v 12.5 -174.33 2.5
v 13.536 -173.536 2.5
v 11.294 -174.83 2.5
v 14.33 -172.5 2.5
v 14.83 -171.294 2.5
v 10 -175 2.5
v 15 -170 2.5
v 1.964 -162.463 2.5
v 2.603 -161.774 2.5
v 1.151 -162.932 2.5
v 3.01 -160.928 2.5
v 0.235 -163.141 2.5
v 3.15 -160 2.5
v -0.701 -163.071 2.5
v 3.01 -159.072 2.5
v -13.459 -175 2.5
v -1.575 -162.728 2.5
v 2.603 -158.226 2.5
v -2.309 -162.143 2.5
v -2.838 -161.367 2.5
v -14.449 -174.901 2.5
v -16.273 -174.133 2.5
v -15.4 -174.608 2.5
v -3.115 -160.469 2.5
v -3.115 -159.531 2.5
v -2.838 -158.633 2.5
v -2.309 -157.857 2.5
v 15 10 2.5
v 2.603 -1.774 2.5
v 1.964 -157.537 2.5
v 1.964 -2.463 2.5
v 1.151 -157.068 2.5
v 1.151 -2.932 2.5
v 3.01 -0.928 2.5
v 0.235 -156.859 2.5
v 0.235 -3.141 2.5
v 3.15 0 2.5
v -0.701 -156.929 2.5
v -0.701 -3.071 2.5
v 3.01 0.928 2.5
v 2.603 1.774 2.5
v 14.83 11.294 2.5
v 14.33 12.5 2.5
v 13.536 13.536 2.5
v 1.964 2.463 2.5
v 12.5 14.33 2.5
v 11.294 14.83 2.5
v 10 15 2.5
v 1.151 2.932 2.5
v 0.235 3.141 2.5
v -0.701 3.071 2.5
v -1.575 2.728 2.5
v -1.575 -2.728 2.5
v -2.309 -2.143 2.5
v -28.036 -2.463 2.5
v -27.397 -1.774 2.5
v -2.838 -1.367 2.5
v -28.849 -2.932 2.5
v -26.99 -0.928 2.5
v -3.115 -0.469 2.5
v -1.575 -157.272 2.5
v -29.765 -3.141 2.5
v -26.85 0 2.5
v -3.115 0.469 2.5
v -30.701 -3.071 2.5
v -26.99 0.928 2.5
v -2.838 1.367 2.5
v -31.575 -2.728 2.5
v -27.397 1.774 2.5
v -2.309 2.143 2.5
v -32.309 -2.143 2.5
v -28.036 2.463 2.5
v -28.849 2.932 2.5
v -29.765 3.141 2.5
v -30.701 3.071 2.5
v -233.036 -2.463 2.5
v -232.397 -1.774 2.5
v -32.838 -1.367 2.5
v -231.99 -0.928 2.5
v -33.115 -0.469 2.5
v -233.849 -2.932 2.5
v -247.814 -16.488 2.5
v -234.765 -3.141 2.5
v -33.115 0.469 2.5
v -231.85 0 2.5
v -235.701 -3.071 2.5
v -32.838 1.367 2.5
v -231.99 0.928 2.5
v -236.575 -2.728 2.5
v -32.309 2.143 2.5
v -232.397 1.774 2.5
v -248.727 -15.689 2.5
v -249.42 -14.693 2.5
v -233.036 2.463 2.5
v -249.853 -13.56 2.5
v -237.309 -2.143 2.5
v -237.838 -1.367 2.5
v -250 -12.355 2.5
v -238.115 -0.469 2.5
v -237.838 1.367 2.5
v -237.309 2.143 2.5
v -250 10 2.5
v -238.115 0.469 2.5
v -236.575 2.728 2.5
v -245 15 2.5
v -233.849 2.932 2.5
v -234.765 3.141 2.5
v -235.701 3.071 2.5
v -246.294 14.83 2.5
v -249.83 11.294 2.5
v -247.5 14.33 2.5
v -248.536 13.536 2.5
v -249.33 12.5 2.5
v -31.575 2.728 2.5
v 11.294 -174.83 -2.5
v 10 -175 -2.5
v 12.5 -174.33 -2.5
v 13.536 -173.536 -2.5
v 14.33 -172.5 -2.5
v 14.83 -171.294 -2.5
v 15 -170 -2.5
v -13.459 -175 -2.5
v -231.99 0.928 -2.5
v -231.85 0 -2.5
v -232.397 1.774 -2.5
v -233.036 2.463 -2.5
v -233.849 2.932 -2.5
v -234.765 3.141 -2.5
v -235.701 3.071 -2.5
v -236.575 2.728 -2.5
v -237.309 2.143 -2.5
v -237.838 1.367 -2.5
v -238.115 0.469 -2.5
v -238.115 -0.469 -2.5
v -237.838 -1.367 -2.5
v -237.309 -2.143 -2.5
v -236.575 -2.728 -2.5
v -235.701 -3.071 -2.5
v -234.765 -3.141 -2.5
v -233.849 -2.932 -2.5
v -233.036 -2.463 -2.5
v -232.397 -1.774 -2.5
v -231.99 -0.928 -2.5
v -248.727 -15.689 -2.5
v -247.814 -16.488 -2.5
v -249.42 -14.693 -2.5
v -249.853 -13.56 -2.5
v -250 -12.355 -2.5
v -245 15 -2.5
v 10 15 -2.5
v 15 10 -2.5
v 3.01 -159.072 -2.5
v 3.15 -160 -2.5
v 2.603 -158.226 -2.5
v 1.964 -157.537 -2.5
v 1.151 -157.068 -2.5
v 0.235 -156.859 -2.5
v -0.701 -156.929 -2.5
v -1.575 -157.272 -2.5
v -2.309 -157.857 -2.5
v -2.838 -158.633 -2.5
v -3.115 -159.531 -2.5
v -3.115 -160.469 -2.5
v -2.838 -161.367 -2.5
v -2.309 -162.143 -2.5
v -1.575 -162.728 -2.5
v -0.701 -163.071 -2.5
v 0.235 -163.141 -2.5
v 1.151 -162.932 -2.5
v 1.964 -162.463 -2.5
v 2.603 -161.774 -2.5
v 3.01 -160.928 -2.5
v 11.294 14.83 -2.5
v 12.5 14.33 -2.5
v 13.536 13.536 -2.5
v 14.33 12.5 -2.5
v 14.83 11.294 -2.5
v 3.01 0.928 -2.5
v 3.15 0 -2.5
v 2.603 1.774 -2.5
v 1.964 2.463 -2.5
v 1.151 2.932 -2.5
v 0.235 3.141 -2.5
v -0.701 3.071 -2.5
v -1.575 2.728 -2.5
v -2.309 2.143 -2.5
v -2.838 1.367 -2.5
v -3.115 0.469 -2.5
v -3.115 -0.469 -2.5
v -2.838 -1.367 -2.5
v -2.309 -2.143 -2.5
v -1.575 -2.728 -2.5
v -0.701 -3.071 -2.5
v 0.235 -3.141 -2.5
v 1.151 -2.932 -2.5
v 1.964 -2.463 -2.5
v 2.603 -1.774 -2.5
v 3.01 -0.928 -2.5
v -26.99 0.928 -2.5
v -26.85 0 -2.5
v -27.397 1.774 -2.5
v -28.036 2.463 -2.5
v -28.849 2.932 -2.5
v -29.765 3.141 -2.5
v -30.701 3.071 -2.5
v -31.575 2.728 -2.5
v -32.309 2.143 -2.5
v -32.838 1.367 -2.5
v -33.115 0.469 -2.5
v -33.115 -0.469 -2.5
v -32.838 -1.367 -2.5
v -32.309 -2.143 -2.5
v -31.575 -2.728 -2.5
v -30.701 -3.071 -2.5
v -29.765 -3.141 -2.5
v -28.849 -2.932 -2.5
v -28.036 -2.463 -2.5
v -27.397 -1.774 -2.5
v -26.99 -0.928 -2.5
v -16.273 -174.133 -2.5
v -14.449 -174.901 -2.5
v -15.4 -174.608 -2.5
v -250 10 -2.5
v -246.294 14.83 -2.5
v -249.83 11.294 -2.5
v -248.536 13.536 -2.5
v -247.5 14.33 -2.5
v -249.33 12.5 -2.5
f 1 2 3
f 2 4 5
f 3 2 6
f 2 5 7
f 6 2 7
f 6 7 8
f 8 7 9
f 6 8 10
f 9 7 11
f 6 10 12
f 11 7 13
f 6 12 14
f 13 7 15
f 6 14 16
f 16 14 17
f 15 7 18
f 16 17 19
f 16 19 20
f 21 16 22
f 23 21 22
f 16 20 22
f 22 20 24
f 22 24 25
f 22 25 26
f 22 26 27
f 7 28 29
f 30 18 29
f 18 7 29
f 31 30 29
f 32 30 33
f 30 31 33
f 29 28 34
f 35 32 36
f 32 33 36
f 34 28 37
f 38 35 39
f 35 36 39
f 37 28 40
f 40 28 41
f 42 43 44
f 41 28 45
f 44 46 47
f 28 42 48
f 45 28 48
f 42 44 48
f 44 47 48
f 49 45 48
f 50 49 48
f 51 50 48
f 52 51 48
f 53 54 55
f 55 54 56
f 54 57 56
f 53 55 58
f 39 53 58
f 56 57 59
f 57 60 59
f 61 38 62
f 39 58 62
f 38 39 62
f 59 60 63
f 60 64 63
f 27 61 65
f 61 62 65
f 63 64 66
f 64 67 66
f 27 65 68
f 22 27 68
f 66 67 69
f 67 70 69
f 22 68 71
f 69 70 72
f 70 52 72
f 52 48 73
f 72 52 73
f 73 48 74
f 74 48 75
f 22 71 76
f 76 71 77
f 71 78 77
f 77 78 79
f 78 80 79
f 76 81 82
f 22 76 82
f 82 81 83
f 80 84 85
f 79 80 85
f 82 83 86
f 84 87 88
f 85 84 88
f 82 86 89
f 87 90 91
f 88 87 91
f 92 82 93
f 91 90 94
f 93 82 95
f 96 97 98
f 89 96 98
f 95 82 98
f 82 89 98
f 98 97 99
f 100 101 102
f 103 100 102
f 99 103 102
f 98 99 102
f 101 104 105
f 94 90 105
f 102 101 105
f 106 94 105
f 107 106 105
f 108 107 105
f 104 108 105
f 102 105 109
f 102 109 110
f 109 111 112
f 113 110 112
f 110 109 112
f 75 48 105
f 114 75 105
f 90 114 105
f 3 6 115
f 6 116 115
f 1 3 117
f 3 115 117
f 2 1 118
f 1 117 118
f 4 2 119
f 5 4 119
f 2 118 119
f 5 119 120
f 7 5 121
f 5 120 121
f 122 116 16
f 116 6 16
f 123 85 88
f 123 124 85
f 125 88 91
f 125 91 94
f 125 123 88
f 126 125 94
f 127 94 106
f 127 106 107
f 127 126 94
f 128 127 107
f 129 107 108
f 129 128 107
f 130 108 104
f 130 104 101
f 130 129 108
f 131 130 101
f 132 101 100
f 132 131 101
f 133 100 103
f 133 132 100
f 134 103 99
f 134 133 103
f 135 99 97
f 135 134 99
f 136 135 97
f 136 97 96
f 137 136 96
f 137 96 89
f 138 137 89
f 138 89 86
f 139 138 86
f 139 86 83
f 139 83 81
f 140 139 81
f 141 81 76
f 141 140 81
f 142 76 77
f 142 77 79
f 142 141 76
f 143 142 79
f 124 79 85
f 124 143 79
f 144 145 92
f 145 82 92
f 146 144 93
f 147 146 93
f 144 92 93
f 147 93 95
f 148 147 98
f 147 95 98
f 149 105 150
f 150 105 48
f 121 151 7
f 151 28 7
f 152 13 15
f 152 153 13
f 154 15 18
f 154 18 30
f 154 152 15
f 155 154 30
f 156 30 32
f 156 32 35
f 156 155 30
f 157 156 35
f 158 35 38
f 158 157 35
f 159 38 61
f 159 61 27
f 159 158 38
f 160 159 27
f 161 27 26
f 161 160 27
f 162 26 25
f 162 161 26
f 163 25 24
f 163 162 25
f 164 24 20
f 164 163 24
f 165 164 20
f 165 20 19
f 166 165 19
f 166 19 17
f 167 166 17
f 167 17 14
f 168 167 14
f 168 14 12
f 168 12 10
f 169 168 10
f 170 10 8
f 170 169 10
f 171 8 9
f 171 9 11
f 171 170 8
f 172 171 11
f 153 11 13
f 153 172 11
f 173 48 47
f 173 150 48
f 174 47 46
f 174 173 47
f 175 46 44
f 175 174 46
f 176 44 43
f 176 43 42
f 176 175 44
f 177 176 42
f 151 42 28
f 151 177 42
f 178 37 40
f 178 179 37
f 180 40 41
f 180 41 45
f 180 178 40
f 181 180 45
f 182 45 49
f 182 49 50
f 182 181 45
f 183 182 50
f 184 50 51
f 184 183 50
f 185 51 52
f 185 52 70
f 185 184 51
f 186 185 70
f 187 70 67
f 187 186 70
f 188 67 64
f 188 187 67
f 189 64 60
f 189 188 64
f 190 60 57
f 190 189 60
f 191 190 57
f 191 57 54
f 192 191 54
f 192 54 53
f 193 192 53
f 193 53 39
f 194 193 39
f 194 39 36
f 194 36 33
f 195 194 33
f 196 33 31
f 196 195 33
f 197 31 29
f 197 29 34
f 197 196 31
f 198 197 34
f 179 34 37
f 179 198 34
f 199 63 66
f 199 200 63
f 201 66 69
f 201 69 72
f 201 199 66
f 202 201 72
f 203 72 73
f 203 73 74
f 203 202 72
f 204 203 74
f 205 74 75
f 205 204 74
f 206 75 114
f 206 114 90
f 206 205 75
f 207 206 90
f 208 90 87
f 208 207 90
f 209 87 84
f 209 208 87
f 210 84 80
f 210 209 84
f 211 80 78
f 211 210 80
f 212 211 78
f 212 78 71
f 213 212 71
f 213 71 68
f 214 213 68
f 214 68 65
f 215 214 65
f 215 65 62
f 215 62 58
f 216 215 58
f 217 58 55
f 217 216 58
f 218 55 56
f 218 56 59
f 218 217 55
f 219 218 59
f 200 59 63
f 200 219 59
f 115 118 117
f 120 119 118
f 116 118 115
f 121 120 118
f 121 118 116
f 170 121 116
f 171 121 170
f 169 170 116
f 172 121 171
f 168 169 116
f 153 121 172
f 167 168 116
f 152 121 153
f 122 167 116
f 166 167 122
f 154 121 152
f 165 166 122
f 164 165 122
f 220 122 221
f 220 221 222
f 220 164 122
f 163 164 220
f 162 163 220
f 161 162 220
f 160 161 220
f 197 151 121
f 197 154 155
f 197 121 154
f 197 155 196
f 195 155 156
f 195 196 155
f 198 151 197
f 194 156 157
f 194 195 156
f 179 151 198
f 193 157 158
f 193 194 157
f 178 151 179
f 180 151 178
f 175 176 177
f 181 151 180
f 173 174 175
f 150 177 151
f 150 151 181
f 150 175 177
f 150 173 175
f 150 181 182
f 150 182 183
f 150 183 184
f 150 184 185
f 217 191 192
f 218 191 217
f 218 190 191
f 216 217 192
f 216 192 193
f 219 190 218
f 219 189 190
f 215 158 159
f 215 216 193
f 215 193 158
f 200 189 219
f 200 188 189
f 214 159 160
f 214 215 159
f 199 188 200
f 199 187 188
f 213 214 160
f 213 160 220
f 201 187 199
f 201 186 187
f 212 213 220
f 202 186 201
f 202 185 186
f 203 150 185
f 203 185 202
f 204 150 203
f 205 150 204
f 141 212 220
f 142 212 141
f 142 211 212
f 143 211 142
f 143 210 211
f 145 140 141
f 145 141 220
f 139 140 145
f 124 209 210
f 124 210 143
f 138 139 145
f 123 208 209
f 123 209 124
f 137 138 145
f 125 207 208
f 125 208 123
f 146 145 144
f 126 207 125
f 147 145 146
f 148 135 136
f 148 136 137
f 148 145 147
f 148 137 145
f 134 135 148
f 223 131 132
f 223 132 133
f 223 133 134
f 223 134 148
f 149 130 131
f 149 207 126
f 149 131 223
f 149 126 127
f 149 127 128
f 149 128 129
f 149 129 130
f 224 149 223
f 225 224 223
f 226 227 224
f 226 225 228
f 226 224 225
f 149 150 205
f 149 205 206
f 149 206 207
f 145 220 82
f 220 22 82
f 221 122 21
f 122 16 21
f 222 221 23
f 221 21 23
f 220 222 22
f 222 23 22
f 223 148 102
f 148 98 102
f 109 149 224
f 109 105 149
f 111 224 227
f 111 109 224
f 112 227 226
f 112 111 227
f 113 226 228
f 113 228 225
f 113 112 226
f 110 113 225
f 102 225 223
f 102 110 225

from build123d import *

# Parameters (mm, degrees)
SKETCH_R  = 3.15
PAD_DEPTH = 2.5
FILLET_R  = 5


with BuildPart() as part:
    # Sketch → Pad (new body, symmetric)
    with BuildSketch(Plane.XY):
        Polygon((-250, 15), (15, 15), (15, -175), (-15, -175), (-250, -15), align=None)
        Circle(SKETCH_R, mode=Mode.SUBTRACT)
        with Locations((0, -160)):
            Circle(SKETCH_R, mode=Mode.SUBTRACT)
        with Locations((-30, 0)):
            Circle(SKETCH_R, mode=Mode.SUBTRACT)
        with Locations((-235, 0)):
            Circle(SKETCH_R, mode=Mode.SUBTRACT)
    extrude(amount=PAD_DEPTH, both=True)

    # Fillet
    fillet_edges = [part.edges().sort_by_distance(p)[0] for p in [
        (-250, 15, 0),
        (-250, -15, 0),
        (15, 15, 0),
        (-15, -175, 0),
        (15, -175, 0),
    ]]
    fillet(fillet_edges, radius=FILLET_R)


solid = part.part
